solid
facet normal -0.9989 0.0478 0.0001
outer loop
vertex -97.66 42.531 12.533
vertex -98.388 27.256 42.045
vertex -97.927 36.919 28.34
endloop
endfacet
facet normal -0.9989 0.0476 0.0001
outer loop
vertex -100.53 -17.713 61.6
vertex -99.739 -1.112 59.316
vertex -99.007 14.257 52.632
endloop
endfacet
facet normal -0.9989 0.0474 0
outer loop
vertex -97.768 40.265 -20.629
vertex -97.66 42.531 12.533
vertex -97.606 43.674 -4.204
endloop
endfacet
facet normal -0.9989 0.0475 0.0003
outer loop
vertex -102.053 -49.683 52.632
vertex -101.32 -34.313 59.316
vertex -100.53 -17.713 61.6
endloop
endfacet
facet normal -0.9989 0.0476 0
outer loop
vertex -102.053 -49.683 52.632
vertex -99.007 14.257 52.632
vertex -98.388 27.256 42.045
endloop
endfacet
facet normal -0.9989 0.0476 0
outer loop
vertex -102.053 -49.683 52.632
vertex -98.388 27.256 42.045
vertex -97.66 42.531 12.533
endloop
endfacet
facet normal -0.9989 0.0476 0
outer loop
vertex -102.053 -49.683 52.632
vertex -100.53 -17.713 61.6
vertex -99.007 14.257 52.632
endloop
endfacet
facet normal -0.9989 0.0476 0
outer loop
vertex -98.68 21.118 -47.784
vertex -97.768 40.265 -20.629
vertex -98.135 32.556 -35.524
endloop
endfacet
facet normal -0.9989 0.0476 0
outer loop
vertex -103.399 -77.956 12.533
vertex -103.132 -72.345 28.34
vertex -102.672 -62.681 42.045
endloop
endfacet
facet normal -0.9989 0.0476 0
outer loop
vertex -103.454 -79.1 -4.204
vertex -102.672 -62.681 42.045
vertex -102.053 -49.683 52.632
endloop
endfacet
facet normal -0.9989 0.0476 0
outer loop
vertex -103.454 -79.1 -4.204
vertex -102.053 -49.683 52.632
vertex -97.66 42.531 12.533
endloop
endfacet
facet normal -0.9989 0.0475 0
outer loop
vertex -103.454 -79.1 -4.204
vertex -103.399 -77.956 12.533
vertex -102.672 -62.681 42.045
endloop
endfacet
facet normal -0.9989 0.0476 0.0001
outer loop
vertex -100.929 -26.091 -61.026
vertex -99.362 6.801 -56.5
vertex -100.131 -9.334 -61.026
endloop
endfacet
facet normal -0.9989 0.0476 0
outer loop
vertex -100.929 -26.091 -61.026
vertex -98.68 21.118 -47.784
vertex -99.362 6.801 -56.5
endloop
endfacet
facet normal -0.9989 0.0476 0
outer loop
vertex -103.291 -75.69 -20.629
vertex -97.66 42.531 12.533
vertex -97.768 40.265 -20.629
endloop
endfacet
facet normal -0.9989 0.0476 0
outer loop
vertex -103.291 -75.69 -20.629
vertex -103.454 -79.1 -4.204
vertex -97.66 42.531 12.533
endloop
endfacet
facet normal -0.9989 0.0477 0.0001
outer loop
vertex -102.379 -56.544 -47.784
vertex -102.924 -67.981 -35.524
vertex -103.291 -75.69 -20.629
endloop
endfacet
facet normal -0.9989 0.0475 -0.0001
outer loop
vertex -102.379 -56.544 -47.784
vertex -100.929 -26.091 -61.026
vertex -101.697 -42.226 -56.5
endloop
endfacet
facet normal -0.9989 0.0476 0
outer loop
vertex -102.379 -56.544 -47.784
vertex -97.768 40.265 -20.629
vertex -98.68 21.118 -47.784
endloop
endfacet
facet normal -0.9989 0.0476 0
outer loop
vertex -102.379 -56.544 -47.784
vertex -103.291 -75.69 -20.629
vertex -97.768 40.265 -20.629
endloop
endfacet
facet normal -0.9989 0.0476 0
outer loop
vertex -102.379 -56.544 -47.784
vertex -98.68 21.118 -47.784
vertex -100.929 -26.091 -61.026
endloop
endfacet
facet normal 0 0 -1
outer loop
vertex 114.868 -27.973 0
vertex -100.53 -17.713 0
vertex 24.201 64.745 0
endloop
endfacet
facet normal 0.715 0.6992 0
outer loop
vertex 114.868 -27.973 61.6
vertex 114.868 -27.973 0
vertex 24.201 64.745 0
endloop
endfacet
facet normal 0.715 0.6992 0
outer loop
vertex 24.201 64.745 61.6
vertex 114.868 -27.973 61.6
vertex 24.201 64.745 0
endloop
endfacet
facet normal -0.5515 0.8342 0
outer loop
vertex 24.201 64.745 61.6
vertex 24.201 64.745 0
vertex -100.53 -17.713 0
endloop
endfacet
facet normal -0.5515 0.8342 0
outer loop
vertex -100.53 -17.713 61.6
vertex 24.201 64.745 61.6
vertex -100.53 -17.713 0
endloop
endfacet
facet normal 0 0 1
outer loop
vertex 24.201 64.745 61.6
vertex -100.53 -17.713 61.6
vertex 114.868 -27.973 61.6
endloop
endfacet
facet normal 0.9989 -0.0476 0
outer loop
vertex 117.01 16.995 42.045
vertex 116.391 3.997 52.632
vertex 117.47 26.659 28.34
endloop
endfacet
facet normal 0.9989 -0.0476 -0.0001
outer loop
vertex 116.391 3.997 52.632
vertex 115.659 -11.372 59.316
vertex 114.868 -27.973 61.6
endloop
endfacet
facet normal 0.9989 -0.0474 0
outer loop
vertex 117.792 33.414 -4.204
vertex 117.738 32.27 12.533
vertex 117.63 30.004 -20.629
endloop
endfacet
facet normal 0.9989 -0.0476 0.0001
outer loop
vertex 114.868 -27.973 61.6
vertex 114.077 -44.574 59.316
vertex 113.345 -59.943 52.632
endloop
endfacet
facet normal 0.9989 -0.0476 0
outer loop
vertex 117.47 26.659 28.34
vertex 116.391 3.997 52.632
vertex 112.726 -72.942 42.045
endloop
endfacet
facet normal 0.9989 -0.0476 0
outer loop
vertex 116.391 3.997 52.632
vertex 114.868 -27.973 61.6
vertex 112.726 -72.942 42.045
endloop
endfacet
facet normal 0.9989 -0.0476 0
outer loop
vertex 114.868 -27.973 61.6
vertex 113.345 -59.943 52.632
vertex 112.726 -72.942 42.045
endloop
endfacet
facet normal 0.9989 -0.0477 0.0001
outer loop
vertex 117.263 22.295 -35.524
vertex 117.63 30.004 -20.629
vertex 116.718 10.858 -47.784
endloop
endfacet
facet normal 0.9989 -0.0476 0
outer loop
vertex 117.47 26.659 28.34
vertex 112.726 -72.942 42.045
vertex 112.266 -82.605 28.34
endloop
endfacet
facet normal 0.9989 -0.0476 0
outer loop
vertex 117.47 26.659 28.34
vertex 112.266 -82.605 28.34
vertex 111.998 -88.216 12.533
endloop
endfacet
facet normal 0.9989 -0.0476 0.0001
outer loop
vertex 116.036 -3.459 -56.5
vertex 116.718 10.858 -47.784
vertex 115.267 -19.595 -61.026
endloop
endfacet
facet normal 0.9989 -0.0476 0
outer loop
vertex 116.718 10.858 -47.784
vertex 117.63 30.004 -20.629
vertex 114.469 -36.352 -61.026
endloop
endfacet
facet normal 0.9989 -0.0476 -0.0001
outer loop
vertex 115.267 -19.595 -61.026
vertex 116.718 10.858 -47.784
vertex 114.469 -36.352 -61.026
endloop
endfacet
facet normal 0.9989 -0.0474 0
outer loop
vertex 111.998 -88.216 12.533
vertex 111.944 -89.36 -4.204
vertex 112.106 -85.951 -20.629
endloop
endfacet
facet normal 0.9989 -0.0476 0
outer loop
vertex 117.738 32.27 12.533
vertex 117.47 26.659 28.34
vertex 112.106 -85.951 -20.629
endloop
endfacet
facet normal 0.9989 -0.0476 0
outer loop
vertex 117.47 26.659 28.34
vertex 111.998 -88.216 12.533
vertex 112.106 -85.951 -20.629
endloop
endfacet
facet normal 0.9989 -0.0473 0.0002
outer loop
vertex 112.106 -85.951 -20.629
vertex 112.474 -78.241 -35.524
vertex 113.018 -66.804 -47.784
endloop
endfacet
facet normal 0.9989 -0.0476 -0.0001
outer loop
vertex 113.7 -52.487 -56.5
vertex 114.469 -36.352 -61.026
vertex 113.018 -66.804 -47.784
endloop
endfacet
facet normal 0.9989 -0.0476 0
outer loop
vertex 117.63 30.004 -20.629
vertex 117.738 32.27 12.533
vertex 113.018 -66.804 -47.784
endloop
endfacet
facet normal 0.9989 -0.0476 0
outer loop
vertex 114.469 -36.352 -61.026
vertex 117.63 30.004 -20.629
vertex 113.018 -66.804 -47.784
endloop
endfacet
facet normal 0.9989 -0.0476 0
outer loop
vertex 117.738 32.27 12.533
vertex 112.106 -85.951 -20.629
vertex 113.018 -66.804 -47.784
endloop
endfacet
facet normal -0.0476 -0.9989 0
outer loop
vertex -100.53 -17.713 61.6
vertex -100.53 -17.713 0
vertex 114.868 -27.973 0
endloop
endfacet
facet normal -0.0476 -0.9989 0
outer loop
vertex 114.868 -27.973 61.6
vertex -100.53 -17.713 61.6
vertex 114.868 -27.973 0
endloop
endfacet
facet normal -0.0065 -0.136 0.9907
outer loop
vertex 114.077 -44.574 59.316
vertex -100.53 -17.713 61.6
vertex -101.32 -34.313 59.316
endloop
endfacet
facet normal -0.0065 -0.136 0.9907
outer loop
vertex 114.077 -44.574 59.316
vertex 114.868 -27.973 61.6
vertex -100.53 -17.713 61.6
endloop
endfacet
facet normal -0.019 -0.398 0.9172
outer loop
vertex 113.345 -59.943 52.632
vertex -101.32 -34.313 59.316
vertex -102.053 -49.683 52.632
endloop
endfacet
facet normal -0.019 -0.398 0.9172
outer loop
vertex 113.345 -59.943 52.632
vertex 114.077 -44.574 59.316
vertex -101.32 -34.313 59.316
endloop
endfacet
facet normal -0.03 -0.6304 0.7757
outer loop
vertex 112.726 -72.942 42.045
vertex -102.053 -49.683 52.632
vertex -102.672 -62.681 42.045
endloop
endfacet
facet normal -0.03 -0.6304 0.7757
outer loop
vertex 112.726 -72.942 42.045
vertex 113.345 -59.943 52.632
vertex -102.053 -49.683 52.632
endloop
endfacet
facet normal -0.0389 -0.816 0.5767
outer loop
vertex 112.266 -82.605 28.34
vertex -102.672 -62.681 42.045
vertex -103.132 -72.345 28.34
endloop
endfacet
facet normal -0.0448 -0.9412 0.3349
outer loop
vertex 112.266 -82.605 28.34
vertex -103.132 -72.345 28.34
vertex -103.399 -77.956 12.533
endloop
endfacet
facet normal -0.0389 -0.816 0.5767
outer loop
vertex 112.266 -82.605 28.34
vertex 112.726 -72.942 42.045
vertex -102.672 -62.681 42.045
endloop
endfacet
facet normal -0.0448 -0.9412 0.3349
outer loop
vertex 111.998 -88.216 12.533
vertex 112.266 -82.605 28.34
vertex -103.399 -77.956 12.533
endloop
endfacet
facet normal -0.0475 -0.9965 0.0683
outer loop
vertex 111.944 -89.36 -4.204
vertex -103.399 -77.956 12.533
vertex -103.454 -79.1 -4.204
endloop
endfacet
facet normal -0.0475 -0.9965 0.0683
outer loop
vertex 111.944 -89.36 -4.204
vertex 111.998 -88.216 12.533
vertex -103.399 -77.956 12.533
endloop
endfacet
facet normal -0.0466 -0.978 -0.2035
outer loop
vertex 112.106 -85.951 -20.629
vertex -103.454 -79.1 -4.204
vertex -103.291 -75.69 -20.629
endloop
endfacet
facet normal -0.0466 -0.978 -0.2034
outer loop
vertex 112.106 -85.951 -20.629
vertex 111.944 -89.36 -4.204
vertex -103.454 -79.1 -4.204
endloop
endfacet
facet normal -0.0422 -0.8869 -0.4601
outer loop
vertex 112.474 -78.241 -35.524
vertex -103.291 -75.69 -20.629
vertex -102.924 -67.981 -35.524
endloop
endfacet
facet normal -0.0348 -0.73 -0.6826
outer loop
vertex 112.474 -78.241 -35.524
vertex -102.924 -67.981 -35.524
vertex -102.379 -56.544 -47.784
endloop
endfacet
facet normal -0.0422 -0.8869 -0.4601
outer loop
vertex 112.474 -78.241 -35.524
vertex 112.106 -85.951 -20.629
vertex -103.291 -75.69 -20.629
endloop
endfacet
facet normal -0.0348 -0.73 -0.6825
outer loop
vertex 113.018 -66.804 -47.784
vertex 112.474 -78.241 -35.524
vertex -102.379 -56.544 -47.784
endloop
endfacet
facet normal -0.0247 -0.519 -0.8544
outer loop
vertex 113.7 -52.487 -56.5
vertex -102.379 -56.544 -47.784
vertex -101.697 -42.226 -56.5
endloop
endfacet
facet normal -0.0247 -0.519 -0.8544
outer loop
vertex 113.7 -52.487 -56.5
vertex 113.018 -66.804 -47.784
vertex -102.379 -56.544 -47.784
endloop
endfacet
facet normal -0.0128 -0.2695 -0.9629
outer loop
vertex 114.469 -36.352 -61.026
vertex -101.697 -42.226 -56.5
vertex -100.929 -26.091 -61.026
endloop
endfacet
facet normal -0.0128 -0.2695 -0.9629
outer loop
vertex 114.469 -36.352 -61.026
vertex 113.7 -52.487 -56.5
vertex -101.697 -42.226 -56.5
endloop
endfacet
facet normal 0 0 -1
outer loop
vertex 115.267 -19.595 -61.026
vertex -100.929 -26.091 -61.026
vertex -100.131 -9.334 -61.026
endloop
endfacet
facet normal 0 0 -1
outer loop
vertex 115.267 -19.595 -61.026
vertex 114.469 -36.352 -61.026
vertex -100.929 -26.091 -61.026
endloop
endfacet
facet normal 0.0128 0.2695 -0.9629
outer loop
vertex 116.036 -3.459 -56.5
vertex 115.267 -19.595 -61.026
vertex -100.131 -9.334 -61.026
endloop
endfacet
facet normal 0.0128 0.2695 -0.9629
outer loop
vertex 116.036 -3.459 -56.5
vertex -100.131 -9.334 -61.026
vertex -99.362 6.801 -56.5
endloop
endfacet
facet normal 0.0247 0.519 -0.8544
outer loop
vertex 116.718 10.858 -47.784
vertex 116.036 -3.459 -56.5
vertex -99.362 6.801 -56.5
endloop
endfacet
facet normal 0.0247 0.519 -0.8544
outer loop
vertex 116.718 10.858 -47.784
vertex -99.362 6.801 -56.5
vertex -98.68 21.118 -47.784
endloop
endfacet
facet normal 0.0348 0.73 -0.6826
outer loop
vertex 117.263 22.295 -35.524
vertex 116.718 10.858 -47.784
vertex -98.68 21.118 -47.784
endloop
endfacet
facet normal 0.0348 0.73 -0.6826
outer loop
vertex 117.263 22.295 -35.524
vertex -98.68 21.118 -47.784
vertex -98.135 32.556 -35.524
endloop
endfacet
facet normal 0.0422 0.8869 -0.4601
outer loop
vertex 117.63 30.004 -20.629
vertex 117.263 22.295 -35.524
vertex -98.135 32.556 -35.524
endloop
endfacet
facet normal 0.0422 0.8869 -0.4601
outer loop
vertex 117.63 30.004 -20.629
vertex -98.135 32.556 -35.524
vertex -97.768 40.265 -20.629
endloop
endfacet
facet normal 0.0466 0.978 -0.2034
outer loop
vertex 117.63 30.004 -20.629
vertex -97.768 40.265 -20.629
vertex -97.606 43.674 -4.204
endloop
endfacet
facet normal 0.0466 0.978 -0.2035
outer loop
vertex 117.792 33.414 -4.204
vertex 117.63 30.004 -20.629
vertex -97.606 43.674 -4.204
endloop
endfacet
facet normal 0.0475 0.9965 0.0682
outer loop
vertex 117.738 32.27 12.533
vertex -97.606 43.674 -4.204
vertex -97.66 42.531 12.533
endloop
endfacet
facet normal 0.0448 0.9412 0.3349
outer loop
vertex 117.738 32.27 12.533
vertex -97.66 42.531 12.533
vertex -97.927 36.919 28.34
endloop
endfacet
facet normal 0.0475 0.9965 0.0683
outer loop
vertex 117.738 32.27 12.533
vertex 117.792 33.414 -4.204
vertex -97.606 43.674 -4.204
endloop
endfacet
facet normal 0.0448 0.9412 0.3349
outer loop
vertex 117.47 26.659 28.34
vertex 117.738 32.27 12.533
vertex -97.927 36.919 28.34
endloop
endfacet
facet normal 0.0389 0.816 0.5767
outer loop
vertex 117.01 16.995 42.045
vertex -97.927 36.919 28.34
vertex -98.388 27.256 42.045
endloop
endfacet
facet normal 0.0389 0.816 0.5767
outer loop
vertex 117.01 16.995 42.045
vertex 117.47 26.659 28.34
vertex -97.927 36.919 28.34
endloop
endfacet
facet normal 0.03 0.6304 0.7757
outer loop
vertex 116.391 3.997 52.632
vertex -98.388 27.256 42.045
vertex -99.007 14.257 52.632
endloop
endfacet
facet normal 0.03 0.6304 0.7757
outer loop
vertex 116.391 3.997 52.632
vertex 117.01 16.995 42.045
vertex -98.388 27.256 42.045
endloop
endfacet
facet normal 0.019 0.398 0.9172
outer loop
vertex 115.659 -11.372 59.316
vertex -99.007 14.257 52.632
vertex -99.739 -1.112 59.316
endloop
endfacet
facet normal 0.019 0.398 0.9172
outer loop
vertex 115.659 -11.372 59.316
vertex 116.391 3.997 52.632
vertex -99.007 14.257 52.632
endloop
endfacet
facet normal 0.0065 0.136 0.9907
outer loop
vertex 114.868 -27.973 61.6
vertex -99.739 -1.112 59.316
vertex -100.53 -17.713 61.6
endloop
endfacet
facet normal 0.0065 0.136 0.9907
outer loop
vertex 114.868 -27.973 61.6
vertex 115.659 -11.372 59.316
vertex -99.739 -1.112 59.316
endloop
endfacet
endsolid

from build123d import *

# Parameters (mm, degrees)
F1_DEPTH  = 61.6
F1_FACE_W = 215.6420267224
F1_FACE_H = 61.6


with BuildPart() as f1:
    # F0 (on Top) → F1 (new body)
    with BuildSketch(Plane.XY):
        Polygon((24.200597778, 64.7449865937), (-100.5296930671, -17.7127569914), (114.8680970073, -27.9731526971), align=None)
    extrude(amount=F1_DEPTH)


with BuildPart() as f2:
    # F1_face (on face) → F2 (revolve)
    with BuildSketch(Plane(origin=(7.1692019701, -22.8429548442, 30.8), x_dir=(0.9988673977, -0.0475806867, 0), z_dir=(-0.0475806867, -0.9988673977, 0))):
        Rectangle(F1_FACE_W, F1_FACE_H)
    revolve(axis=Axis((7.1692019701, -22.8429548442, 0), (0.9988673977, -0.0475806867, 0)))


solid = Compound([f1.part, f2.part])
